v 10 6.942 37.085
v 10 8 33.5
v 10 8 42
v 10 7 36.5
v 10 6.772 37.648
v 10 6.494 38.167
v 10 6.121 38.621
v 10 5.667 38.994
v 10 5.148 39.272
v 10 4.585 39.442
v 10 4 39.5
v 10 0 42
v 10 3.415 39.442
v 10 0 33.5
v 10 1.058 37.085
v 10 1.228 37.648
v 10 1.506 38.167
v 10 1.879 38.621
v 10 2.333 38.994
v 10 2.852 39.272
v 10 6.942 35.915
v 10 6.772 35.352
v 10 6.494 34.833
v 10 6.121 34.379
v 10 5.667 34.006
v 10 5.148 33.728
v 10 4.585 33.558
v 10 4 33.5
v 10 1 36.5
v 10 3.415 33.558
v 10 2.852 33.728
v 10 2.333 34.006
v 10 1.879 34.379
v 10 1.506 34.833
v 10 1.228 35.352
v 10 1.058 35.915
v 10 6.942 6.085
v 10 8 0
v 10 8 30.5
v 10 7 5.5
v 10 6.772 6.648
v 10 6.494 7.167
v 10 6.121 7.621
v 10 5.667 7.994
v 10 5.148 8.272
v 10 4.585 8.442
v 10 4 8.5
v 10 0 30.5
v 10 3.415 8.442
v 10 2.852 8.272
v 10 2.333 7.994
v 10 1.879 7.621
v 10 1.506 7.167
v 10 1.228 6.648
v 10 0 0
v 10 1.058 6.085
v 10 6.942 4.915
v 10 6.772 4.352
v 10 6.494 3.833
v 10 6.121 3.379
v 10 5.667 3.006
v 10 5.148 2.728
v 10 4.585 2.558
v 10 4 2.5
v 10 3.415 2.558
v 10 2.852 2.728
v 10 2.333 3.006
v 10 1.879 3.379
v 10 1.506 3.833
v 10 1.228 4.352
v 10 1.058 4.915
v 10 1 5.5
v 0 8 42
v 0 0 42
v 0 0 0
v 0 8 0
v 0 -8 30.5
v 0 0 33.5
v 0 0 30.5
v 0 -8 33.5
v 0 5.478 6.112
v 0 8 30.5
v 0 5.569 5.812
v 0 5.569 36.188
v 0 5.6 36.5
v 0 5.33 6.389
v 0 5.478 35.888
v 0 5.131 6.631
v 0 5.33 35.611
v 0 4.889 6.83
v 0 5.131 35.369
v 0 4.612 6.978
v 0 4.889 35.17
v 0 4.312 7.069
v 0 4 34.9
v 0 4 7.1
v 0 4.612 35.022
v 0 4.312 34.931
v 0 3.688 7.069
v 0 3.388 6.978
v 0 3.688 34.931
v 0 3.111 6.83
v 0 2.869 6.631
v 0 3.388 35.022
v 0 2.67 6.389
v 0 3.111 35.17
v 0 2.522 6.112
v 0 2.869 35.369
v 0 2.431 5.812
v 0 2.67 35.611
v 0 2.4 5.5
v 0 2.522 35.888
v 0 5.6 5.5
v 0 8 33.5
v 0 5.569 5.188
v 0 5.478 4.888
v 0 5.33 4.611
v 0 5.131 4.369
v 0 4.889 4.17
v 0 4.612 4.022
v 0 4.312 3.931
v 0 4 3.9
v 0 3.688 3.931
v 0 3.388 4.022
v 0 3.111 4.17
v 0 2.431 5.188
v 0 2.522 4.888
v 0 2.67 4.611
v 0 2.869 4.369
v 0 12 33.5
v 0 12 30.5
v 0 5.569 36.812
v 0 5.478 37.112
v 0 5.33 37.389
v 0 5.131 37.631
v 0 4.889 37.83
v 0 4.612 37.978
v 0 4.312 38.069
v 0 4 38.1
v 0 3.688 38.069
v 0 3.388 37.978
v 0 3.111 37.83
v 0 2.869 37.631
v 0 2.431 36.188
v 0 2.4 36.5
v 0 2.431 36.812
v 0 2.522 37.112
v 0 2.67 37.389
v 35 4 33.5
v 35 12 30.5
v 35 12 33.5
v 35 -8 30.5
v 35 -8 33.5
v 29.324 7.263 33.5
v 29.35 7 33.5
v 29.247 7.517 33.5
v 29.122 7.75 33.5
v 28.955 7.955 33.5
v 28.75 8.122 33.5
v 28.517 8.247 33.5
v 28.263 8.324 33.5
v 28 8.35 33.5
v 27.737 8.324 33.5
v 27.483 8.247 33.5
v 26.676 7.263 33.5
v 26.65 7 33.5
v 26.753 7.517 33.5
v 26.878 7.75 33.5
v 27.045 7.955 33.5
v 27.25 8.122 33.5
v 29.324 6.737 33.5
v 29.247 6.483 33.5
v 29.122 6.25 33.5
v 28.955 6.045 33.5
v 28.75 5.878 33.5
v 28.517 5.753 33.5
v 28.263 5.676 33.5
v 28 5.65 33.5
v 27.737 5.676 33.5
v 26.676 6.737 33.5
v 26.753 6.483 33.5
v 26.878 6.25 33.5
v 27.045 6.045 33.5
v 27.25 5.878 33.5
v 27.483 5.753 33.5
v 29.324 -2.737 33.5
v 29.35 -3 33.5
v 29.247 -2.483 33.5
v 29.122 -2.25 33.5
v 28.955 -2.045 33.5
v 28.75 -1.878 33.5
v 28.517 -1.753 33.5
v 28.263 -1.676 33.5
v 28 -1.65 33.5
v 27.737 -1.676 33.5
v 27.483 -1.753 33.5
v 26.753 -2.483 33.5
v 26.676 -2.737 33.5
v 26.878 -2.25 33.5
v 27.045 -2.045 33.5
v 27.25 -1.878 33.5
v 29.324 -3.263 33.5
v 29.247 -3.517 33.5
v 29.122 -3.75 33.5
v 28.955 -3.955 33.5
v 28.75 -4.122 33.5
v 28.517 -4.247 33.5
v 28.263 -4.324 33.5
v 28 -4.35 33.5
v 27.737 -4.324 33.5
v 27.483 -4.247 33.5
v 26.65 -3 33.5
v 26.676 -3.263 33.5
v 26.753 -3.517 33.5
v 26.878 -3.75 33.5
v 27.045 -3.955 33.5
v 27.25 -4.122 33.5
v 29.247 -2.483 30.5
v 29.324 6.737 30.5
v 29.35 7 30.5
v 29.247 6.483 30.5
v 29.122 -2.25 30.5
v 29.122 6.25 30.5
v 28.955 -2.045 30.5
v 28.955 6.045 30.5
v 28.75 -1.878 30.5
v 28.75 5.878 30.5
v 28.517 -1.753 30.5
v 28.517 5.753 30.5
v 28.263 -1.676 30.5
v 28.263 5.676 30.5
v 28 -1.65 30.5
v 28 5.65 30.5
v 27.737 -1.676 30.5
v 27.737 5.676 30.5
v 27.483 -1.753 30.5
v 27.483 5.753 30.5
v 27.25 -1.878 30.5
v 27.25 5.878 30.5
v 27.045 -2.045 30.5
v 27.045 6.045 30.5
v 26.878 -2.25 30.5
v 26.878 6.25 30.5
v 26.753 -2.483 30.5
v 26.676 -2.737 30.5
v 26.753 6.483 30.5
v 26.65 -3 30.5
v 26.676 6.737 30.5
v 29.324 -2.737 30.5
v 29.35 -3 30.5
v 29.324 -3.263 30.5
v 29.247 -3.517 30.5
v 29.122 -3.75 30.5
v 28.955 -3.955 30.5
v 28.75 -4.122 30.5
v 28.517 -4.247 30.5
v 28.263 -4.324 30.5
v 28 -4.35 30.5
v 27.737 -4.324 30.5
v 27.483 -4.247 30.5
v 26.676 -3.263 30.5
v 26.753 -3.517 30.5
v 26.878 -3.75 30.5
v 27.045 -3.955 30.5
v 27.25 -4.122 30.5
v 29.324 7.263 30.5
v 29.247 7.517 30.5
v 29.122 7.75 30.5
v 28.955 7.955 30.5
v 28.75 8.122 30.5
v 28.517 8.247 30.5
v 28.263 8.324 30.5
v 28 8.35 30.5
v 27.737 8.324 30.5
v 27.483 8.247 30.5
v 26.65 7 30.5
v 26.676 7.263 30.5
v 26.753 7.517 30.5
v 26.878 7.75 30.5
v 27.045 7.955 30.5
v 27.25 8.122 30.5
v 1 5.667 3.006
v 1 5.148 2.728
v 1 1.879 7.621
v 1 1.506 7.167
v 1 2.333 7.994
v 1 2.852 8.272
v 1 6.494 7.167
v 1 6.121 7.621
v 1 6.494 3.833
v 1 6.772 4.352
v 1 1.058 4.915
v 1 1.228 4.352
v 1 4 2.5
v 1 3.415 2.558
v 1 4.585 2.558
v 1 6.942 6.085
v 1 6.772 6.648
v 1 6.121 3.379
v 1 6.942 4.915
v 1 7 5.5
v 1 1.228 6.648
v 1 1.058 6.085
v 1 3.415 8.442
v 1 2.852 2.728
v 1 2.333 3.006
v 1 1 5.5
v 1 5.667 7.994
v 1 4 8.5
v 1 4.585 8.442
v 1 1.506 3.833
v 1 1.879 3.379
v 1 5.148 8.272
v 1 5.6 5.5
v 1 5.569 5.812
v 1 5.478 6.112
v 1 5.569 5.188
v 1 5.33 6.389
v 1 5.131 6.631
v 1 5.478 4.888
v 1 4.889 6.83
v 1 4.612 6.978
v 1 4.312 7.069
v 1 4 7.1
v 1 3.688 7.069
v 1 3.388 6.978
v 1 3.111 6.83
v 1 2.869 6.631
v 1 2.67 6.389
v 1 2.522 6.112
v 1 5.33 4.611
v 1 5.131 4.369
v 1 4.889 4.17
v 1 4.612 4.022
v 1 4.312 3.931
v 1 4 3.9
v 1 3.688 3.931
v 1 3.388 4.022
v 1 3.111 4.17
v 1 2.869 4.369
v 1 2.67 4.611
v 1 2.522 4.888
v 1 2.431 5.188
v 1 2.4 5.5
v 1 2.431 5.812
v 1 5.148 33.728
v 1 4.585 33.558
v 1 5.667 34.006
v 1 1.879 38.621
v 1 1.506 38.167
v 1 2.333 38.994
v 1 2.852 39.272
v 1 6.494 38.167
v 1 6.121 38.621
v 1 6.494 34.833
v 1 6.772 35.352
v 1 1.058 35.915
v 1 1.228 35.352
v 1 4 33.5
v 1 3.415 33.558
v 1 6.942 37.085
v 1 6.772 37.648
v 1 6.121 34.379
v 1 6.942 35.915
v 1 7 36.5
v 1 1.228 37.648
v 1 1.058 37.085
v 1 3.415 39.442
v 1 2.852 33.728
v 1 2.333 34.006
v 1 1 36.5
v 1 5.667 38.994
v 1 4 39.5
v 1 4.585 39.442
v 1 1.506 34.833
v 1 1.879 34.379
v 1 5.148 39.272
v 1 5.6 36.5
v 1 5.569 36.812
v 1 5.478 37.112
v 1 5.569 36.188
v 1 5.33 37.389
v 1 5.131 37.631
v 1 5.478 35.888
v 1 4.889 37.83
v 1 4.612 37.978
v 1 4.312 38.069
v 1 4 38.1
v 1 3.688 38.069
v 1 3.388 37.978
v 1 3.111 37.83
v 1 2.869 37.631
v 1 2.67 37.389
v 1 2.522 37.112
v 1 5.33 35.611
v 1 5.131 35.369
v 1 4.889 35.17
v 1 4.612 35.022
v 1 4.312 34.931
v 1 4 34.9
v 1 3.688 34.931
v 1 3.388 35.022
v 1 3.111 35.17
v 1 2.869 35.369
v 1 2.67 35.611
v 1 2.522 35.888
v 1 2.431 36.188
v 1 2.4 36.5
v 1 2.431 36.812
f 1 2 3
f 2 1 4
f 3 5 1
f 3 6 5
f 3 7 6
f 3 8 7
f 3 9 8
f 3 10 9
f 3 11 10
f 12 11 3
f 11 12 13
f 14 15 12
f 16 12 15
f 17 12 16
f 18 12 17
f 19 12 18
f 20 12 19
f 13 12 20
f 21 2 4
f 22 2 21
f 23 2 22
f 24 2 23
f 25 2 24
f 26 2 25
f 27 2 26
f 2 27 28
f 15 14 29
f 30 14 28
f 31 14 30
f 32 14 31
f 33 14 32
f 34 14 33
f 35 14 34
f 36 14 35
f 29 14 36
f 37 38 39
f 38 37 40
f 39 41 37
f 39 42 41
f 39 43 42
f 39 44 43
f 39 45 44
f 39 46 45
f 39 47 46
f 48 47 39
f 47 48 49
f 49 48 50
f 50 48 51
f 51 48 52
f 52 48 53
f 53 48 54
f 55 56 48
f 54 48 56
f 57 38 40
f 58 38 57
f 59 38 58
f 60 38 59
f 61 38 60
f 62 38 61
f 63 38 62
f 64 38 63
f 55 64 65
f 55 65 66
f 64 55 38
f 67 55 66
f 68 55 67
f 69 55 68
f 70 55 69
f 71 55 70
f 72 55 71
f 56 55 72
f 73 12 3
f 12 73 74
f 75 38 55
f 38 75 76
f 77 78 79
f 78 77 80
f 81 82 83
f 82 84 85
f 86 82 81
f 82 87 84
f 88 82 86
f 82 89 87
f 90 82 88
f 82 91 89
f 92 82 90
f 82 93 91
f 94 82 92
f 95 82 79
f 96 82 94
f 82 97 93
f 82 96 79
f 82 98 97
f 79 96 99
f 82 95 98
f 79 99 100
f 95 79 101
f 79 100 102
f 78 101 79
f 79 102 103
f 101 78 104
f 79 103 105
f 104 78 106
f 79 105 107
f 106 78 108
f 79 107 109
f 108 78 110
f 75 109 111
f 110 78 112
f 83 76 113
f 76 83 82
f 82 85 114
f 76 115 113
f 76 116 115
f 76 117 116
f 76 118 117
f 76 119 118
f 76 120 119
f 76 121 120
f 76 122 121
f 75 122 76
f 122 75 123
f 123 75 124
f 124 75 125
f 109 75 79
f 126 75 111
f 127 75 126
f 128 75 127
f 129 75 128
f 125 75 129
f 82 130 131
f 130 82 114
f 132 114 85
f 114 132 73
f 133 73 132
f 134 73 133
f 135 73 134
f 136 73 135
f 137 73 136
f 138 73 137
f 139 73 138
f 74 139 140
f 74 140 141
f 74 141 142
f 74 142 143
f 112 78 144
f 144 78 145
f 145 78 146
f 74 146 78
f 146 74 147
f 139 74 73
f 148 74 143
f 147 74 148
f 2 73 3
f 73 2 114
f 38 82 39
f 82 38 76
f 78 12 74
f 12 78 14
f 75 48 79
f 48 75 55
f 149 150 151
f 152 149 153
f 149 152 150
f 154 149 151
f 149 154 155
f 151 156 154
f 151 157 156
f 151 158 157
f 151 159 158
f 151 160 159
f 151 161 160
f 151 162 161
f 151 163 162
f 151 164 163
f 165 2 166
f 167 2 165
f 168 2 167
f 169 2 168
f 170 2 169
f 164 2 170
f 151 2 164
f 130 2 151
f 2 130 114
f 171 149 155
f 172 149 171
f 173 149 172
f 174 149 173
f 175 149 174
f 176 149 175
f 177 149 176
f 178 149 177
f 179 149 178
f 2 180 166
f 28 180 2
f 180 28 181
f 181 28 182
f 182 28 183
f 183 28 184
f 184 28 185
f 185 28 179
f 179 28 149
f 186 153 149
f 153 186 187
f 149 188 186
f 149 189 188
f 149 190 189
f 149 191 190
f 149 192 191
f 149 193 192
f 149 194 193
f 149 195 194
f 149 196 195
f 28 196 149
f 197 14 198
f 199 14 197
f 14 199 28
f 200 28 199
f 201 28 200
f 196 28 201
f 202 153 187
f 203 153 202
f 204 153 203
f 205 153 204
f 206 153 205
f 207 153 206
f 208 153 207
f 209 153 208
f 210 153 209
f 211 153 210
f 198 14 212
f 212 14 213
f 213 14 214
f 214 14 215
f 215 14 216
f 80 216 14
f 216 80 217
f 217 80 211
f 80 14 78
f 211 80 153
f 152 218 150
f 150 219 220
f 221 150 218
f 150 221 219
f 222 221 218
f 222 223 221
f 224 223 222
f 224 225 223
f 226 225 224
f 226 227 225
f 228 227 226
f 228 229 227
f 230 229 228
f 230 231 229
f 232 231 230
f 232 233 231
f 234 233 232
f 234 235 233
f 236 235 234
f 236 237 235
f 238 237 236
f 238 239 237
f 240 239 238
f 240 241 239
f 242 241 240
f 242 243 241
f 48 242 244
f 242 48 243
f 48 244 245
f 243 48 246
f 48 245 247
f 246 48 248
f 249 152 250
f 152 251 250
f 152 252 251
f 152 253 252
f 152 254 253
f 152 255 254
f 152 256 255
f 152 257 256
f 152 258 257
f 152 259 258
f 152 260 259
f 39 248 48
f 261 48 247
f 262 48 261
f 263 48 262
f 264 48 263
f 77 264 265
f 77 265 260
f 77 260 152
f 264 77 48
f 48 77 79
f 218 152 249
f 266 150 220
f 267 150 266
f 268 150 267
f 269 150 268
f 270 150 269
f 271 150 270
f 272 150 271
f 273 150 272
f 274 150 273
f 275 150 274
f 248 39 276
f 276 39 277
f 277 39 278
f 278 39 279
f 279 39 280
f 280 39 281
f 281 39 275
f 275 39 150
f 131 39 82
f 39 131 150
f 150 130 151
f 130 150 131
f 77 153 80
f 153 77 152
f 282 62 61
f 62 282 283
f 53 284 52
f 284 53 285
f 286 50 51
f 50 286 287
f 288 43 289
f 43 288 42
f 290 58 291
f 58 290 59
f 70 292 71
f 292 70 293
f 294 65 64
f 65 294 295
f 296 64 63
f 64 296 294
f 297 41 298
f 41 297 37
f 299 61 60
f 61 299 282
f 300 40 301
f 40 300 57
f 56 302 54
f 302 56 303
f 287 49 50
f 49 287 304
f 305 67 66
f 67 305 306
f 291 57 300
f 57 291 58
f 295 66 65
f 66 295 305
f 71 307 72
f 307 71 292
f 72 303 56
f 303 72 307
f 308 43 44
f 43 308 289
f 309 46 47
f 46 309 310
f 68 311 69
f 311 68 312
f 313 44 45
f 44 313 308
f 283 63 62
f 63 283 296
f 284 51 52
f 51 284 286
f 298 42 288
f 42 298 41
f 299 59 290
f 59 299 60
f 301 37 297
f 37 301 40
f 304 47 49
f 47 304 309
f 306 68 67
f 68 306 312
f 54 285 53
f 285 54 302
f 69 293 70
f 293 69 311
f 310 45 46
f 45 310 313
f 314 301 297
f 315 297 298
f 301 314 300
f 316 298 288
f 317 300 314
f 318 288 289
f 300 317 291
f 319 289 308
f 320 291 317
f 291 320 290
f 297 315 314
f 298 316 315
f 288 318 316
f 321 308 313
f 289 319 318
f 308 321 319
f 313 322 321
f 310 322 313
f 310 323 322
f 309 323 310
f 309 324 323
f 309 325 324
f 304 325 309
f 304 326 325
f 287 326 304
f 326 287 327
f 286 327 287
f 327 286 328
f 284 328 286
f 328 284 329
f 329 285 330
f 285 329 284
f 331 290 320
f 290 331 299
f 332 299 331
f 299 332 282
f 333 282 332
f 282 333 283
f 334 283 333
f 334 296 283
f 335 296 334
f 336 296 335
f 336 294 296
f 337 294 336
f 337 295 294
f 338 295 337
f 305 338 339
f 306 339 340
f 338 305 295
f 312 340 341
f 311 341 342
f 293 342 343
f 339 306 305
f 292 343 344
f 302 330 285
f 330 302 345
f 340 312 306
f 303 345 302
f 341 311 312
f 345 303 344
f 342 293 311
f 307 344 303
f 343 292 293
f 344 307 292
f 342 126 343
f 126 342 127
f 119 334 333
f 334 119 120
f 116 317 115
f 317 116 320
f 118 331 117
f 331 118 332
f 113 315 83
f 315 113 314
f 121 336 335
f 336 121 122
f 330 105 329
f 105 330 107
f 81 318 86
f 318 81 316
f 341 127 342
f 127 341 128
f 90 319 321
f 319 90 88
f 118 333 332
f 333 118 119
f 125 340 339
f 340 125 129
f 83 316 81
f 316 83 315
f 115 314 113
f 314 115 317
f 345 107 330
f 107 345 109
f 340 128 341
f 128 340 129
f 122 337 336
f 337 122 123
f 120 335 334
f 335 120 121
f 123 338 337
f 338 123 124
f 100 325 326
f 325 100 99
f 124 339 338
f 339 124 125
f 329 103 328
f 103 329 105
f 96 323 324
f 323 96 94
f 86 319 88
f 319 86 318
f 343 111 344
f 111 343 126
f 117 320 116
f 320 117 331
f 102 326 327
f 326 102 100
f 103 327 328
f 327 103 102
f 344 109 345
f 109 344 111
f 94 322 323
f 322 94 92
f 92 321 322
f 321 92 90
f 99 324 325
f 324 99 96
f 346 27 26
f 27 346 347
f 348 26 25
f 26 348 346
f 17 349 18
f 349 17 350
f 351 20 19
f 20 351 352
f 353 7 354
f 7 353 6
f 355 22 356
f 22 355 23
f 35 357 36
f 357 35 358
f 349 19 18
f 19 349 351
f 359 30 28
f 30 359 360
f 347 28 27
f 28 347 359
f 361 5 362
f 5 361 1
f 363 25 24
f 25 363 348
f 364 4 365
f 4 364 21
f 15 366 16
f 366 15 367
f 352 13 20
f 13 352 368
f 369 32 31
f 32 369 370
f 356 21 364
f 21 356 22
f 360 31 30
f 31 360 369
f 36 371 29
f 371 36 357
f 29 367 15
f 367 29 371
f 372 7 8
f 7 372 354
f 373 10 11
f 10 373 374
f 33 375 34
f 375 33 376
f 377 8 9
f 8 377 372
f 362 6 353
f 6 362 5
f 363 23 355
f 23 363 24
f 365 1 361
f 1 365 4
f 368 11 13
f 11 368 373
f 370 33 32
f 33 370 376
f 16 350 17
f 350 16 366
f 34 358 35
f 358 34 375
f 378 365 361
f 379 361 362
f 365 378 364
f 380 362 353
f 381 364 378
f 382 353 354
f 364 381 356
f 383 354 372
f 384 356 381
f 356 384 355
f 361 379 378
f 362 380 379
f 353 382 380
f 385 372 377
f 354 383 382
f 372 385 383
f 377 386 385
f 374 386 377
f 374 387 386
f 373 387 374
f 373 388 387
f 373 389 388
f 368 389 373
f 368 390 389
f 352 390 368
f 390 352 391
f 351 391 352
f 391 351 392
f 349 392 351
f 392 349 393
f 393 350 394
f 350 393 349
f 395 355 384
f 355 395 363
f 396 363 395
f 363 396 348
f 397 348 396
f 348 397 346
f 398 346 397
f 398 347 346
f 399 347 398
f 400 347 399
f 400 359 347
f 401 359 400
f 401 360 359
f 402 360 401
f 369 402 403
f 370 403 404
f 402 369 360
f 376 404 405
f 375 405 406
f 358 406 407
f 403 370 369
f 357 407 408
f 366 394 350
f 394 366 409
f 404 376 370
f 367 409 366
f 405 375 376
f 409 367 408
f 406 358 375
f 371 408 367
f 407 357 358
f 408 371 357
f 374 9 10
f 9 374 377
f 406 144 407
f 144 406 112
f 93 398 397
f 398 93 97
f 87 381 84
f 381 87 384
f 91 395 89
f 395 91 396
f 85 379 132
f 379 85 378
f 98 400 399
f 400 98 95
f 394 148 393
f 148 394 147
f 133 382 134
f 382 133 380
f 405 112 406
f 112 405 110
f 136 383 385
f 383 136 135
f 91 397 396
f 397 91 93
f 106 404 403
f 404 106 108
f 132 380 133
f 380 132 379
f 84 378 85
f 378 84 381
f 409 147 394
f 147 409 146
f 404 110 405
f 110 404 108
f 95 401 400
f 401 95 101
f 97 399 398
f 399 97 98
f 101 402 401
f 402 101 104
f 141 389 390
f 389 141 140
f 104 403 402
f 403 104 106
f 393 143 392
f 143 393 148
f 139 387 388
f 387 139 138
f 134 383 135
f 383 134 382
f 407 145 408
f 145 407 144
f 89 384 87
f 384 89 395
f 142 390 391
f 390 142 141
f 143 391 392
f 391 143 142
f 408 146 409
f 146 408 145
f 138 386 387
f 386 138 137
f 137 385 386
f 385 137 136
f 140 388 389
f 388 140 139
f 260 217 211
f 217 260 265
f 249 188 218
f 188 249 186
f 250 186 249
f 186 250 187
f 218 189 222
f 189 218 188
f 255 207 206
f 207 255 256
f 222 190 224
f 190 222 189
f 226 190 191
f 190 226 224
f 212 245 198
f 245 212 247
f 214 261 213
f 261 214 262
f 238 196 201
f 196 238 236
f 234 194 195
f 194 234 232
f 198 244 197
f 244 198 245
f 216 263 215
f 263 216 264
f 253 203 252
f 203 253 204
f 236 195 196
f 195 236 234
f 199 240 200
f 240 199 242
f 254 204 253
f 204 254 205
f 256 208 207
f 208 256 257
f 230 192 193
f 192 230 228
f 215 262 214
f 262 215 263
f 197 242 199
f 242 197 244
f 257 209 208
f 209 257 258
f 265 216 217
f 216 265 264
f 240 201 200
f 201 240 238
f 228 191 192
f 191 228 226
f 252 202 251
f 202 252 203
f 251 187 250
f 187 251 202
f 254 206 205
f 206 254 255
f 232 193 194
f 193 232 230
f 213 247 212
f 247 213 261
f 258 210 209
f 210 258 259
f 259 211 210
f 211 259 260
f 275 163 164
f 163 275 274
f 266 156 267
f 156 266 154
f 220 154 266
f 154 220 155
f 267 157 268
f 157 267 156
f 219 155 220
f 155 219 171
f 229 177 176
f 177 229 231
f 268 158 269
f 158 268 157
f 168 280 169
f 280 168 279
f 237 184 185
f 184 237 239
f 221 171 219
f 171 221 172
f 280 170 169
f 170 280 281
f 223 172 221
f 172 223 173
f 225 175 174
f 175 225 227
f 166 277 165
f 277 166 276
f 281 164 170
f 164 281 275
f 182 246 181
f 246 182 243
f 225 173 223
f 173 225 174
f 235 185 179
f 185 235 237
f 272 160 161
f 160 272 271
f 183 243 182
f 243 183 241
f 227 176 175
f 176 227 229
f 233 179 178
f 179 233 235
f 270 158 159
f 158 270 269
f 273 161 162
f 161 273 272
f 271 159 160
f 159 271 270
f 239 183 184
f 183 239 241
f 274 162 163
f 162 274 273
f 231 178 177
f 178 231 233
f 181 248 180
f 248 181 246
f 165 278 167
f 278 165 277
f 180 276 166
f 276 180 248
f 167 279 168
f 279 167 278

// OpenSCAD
//customisation alfawise c10 - axe X nouvelle pièce pour intégrer la fixation d'un début de course
echo(version=version());

epsilon=0.1;
long_moteur=42;
diam_tete_vis=6;
diam_vis=3.2;
epaisseur_fixation_vis=1;
entraxe_vis=31;
epaisseur_platine=8;
largeur_platine=10;
long_inter=35;
larg_inter=20;
haut_inter=3;
diam_fix_inter=2.7;
pas_fix_inter=5;//un pas depuis le bord, deux pas entre les deux trous et un autre pas jusqu'à l'autre bord
retrait_inter=7;

difference(){
    union(){
        //fixation
        cube([largeur_platine,epaisseur_platine,long_moteur],0);
        //platine support inter
        translate([0,-epaisseur_platine,long_moteur-(long_moteur-entraxe_vis)/2-diam_tete_vis/2-haut_inter]){
            cube([long_inter,larg_inter,haut_inter],0);
        }
        
    }
    union(){
        //2x tete+vis moteur
        union(){
            //tete vis du bas
            translate([epaisseur_fixation_vis,epaisseur_platine/2,(long_moteur-entraxe_vis)/2]){
                rotate([0,90,0]){
                    cylinder(largeur_platine-epaisseur_fixation_vis+epsilon,(diam_tete_vis/2),(diam_tete_vis/2),$fn=32);
                }
            }
            //trou vis du bas
            translate([-epsilon,epaisseur_platine/2,(long_moteur-entraxe_vis)/2]){
                rotate([0,90,0]){
                    cylinder(largeur_platine-epaisseur_fixation_vis+epsilon,(diam_vis/2),(diam_vis/2),$fn=32);
                }
            }
            //tete vis du haut
            translate([epaisseur_fixation_vis,epaisseur_platine/2,long_moteur-(long_moteur-entraxe_vis)/2]){
                rotate([0,90,0]){
                    cylinder(long_moteur+epsilon,(diam_tete_vis/2),(diam_tete_vis/2),$fn=32);
                }
            }
            //trou vis du haut
            translate([-epsilon,epaisseur_platine/2,long_moteur-(long_moteur-entraxe_vis)/2]){
                rotate([0,90,0]){
                    cylinder(largeur_platine-epaisseur_fixation_vis+epsilon,(diam_vis/2),(diam_vis/2),$fn=32);
                }
            }
        }
        //2x vis inter
        union(){
            //coté avant
            translate([long_inter-retrait_inter,pas_fix_inter-epaisseur_platine,long_moteur-(long_moteur-entraxe_vis)/2-diam_tete_vis/2-haut_inter-epsilon]){
                cylinder(haut_inter+2*epsilon,diam_fix_inter/2,diam_fix_inter/2,$fn=32);
            }
            //coté rail
            translate([long_inter-retrait_inter,3*pas_fix_inter-epaisseur_platine,long_moteur-(long_moteur-entraxe_vis)/2-diam_tete_vis/2-haut_inter-epsilon]){
                cylinder(haut_inter+2*epsilon,diam_fix_inter/2,diam_fix_inter/2,$fn=32);
            }
        }
    }
}
